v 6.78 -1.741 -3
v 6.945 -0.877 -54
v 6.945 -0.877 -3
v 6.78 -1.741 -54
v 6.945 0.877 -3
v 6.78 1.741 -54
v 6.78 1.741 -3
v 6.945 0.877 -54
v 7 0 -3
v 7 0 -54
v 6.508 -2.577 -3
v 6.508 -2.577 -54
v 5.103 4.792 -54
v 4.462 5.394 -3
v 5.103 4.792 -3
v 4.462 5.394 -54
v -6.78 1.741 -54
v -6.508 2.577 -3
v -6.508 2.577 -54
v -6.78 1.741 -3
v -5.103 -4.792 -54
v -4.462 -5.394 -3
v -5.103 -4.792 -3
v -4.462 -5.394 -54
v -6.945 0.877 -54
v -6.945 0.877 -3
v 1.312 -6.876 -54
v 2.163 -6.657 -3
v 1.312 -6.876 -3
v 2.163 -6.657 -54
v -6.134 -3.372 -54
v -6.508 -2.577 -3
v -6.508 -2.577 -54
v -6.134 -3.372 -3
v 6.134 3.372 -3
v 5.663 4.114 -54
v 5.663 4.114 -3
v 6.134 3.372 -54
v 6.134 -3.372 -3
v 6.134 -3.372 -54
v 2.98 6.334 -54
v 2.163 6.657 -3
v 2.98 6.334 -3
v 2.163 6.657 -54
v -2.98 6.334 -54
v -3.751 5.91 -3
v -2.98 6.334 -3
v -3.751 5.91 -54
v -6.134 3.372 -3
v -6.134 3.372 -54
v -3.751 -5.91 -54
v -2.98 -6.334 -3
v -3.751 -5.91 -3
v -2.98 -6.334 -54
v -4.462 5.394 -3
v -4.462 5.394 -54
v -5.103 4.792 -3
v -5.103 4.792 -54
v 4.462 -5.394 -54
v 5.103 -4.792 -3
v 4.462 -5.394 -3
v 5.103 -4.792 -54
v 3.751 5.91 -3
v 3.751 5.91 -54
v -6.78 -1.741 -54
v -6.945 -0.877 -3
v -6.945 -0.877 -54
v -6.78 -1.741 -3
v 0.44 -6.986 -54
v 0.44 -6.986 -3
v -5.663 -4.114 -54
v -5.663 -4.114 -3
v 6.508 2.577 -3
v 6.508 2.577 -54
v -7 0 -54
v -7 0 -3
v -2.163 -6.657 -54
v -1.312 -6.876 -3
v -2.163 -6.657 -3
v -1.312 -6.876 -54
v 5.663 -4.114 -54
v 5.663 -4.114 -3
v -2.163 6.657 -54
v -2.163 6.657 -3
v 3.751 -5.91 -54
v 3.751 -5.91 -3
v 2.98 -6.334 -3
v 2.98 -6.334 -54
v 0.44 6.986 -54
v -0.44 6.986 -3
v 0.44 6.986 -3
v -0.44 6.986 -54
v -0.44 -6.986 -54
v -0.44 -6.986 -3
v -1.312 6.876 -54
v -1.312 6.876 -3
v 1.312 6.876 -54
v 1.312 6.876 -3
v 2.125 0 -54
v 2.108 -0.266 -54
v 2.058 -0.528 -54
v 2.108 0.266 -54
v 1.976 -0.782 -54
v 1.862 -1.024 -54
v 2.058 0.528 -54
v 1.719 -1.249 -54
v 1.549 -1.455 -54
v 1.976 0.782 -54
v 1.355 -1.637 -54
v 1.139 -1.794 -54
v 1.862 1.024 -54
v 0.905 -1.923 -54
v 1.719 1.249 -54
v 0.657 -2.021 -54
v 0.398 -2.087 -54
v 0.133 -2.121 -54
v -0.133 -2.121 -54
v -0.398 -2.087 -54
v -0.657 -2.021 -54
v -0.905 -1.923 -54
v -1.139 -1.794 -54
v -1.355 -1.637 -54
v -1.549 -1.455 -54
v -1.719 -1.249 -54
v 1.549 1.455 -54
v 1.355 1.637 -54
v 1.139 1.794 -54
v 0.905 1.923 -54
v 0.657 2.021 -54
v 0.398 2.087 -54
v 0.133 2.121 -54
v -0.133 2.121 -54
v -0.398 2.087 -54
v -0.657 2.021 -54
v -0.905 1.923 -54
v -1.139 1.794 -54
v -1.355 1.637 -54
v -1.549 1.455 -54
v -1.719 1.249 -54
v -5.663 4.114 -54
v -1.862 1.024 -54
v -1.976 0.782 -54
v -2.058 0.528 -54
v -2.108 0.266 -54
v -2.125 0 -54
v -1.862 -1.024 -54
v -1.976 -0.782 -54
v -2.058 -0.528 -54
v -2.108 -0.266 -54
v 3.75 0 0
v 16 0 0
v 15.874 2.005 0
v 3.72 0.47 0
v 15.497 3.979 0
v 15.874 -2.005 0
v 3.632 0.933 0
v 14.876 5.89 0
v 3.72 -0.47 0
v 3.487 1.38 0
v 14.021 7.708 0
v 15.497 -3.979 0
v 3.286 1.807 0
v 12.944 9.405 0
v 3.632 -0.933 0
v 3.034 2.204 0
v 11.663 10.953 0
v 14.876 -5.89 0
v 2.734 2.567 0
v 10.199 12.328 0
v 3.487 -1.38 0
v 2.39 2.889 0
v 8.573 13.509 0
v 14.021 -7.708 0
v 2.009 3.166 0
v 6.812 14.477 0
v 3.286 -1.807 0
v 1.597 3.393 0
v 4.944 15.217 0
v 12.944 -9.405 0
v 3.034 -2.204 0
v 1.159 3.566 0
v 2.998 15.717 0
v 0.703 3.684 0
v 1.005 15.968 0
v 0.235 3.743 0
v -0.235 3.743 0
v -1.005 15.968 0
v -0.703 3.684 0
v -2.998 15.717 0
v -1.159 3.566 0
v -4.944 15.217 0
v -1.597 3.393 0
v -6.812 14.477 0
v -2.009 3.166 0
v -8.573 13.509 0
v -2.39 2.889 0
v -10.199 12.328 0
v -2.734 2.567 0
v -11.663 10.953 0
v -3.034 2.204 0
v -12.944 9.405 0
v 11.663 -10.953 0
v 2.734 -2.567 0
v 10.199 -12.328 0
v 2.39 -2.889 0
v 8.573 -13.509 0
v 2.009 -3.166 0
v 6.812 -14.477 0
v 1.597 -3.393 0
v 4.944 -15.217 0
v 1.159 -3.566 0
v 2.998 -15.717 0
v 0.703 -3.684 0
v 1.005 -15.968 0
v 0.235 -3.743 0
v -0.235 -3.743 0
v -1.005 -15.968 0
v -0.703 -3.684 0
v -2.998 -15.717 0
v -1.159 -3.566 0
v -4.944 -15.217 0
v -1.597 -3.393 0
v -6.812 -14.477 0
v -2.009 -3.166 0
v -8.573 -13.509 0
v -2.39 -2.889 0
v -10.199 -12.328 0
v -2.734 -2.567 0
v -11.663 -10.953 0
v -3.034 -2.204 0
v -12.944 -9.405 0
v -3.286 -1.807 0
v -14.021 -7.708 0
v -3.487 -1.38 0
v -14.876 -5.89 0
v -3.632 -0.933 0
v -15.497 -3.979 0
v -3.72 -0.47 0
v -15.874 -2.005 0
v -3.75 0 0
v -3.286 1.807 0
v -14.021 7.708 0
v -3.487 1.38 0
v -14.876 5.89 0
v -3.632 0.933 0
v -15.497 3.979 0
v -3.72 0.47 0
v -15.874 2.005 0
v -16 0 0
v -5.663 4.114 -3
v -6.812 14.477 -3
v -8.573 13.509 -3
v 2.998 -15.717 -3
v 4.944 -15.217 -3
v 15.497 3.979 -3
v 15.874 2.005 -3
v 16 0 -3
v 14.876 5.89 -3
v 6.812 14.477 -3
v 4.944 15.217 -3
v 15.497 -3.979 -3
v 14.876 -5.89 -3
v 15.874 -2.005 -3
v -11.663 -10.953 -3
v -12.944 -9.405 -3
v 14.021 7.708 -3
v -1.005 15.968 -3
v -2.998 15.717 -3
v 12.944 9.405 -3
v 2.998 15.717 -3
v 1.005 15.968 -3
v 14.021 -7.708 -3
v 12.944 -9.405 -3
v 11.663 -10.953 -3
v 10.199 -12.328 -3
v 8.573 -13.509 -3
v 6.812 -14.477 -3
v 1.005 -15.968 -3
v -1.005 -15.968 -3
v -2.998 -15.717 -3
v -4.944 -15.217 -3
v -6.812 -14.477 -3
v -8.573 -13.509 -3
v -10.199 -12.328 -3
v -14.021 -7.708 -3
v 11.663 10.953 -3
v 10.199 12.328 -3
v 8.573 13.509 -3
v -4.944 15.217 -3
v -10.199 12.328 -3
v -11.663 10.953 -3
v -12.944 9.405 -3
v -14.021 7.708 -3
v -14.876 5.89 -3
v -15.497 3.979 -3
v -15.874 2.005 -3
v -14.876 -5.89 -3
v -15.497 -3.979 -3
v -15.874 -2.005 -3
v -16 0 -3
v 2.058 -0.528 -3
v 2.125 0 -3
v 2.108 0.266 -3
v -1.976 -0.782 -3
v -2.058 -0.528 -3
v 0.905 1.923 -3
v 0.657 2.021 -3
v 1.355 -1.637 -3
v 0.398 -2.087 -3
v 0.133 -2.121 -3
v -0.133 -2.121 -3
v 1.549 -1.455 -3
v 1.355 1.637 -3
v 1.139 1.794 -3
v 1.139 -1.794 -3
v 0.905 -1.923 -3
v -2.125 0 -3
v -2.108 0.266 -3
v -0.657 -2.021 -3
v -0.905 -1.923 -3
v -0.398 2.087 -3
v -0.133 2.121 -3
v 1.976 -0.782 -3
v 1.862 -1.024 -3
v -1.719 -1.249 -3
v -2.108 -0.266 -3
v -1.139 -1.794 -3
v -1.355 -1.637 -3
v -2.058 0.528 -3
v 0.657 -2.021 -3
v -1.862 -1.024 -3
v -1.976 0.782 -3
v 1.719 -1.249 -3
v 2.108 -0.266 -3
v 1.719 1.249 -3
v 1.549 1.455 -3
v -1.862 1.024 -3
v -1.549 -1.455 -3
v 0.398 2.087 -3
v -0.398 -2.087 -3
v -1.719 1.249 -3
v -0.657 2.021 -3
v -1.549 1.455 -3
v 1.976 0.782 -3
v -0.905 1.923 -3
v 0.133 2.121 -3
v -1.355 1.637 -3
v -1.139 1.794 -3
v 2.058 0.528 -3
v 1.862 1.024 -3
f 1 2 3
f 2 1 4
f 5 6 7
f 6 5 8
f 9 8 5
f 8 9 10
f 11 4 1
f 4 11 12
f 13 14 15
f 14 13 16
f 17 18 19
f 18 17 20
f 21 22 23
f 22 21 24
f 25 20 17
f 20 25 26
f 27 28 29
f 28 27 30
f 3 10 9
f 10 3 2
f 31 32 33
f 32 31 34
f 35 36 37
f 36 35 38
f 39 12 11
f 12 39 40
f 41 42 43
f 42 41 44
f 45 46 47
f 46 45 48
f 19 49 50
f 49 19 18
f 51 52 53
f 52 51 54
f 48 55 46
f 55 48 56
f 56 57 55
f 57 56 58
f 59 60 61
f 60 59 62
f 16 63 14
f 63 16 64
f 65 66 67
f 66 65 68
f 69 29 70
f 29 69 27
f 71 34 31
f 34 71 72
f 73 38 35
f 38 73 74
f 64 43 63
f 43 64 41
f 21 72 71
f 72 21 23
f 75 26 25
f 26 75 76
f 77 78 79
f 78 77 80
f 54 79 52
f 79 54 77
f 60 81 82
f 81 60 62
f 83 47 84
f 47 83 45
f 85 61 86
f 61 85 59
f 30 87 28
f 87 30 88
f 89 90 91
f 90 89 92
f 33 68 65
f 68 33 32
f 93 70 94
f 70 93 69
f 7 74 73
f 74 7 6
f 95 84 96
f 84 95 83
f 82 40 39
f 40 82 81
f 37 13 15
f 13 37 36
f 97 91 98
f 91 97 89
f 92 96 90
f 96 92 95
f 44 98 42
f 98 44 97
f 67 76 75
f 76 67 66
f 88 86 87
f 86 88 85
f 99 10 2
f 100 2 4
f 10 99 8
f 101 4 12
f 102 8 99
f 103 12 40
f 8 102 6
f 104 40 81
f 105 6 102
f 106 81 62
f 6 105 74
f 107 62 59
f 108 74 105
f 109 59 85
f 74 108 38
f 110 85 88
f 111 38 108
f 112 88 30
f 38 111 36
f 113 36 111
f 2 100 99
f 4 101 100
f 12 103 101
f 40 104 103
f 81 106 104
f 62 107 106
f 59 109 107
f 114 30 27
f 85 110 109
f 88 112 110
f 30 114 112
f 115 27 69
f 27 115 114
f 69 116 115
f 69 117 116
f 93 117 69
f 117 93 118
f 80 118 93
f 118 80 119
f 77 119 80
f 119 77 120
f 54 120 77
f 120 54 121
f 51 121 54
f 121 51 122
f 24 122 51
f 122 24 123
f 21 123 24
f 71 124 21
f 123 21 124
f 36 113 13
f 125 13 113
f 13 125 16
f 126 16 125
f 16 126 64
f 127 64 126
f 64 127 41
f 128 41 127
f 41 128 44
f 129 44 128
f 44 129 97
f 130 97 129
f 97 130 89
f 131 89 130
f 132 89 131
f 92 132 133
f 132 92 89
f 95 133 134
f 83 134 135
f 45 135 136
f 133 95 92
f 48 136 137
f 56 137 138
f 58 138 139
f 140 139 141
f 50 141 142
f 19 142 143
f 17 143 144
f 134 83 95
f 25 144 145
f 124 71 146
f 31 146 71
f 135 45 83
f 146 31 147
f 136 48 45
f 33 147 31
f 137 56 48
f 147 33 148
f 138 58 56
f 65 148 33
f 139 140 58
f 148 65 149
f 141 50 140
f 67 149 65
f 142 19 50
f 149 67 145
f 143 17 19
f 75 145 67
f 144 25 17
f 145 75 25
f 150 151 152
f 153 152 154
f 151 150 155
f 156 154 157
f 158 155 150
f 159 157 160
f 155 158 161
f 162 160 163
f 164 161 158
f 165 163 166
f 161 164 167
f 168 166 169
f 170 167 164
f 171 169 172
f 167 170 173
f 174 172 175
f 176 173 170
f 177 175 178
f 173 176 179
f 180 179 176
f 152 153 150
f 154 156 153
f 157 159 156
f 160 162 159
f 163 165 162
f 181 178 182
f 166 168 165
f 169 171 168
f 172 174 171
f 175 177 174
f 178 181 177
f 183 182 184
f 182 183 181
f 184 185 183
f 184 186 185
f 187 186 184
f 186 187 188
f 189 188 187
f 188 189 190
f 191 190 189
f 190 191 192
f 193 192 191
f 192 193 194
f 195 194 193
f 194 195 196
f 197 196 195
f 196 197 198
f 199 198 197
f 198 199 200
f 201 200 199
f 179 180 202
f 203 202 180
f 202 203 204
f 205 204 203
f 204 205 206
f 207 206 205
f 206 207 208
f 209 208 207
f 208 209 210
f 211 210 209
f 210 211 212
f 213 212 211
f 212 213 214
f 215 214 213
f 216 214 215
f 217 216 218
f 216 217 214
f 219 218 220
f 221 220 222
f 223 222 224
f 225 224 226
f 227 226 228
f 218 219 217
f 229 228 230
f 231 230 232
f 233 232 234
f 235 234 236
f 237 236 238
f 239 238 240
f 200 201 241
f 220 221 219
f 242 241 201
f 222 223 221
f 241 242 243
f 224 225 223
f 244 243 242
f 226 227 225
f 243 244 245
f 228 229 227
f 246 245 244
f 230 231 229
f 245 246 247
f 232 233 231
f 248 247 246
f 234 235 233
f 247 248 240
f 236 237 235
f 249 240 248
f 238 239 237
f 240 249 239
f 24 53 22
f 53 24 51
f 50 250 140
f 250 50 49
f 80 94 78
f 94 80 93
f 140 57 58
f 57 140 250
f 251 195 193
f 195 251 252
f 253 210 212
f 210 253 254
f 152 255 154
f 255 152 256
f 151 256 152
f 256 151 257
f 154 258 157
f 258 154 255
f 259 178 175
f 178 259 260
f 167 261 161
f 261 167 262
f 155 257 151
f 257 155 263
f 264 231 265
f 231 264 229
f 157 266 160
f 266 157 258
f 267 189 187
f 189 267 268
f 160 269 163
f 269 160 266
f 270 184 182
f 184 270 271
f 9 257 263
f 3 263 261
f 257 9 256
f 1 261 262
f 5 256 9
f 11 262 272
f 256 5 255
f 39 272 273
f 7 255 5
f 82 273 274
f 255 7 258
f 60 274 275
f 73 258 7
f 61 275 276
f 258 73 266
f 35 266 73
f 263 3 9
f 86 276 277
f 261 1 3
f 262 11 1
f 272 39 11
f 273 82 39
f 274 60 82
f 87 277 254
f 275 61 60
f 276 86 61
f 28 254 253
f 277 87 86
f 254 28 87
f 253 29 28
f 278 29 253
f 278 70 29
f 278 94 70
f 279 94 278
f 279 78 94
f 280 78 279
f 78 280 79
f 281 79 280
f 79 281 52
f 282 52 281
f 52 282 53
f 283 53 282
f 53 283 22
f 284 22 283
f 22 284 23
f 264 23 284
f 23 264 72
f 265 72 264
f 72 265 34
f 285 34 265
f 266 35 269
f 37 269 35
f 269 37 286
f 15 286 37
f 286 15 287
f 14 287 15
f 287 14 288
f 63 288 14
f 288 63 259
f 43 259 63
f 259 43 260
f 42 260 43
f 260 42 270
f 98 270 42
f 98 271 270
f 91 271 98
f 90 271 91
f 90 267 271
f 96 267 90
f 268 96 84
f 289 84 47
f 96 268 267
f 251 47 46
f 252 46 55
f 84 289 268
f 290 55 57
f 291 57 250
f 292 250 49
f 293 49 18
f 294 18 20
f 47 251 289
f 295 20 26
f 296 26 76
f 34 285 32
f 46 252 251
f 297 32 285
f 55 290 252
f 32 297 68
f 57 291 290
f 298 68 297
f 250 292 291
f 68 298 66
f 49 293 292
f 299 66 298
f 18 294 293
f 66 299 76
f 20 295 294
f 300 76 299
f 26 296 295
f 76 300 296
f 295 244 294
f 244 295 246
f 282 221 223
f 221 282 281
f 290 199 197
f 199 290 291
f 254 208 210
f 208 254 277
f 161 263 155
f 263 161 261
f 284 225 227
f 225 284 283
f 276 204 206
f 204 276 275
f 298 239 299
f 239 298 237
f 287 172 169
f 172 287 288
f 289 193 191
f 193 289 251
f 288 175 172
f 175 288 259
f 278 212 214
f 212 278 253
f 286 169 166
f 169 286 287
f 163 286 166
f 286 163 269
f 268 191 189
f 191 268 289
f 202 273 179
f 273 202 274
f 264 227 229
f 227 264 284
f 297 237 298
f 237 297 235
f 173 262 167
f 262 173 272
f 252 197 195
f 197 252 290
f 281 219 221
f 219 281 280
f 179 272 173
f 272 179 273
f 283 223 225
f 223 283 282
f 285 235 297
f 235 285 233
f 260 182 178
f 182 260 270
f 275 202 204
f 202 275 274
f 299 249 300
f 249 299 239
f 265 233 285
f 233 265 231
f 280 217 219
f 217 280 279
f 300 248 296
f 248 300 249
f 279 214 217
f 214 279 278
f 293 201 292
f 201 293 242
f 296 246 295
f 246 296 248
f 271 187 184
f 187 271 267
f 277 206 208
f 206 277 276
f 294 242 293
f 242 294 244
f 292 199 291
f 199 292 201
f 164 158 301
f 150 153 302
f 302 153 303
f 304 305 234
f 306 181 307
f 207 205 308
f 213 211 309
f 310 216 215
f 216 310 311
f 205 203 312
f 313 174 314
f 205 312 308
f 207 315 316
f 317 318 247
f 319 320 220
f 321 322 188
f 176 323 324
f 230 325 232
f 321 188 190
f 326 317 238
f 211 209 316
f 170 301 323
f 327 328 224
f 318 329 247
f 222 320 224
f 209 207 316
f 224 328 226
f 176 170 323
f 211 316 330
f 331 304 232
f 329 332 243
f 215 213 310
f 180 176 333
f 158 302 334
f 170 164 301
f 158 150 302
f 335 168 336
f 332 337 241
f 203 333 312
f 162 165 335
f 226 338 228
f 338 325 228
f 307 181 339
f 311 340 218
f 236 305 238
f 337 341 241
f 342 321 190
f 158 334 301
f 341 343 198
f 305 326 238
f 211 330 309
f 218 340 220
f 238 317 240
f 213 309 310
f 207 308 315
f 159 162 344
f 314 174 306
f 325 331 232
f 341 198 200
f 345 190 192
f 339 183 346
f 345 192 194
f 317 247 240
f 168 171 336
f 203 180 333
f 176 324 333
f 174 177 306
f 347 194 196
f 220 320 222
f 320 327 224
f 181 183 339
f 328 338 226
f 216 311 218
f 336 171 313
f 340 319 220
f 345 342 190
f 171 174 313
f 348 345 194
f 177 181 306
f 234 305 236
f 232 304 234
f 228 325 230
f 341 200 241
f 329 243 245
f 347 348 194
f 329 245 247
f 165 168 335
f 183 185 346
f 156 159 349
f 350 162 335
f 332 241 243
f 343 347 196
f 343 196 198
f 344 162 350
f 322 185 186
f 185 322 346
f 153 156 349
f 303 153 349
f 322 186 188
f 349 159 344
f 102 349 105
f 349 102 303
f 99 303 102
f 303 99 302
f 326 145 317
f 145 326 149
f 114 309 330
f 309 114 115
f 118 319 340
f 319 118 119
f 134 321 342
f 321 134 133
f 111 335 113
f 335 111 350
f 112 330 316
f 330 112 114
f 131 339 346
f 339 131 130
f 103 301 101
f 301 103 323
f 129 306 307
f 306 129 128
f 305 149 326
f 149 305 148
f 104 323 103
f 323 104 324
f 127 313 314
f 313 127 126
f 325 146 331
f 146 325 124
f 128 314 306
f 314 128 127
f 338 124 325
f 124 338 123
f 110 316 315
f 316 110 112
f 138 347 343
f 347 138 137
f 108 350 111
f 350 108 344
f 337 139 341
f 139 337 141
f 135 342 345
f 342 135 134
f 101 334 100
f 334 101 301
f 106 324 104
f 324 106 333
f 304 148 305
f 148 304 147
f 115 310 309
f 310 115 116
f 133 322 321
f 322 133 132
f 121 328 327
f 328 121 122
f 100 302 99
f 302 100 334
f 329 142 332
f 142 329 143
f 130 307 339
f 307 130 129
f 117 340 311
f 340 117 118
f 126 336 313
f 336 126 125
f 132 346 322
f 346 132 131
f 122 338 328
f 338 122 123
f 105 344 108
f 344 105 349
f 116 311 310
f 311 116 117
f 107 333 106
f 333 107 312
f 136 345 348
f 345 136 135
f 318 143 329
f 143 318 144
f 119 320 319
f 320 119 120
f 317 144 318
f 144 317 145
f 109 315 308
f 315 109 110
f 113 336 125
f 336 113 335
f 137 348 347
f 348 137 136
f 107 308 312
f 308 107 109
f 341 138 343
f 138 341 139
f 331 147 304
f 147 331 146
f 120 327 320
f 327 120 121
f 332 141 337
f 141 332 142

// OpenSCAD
$fn = 50;


difference() {
	union() {
		translate(v = [0, 0, -54.0000000000]) {
			cylinder(h = 54, r = 7.0000000000);
		}
		translate(v = [0, 0, -3.0000000000]) {
			cylinder(h = 3, r = 16.0000000000);
		}
	}
	union() {
		translate(v = [0, 0, 0]) {
			rotate(a = [0, 0, 0]) {
				difference() {
					union() {
						#translate(v = [0, 0, -54.0000000000]) {
							cylinder(h = 54, r = 2.0000000000);
						}
						#translate(v = [0, 0, -3]) {
							cylinder(h = 3, r = 7.0000000000, r1 = 2.1250000000, r2 = 3.7500000000);
						}
						#translate(v = [0, 0, -54.0000000000]) {
							cylinder(h = 54, r = 2.1250000000);
						}
						#translate(v = [0, 0, -54.0000000000]) {
							cylinder(h = 54, r = 2.0000000000);
						}
					}
					union();
				}
			}
		}
	}
}
